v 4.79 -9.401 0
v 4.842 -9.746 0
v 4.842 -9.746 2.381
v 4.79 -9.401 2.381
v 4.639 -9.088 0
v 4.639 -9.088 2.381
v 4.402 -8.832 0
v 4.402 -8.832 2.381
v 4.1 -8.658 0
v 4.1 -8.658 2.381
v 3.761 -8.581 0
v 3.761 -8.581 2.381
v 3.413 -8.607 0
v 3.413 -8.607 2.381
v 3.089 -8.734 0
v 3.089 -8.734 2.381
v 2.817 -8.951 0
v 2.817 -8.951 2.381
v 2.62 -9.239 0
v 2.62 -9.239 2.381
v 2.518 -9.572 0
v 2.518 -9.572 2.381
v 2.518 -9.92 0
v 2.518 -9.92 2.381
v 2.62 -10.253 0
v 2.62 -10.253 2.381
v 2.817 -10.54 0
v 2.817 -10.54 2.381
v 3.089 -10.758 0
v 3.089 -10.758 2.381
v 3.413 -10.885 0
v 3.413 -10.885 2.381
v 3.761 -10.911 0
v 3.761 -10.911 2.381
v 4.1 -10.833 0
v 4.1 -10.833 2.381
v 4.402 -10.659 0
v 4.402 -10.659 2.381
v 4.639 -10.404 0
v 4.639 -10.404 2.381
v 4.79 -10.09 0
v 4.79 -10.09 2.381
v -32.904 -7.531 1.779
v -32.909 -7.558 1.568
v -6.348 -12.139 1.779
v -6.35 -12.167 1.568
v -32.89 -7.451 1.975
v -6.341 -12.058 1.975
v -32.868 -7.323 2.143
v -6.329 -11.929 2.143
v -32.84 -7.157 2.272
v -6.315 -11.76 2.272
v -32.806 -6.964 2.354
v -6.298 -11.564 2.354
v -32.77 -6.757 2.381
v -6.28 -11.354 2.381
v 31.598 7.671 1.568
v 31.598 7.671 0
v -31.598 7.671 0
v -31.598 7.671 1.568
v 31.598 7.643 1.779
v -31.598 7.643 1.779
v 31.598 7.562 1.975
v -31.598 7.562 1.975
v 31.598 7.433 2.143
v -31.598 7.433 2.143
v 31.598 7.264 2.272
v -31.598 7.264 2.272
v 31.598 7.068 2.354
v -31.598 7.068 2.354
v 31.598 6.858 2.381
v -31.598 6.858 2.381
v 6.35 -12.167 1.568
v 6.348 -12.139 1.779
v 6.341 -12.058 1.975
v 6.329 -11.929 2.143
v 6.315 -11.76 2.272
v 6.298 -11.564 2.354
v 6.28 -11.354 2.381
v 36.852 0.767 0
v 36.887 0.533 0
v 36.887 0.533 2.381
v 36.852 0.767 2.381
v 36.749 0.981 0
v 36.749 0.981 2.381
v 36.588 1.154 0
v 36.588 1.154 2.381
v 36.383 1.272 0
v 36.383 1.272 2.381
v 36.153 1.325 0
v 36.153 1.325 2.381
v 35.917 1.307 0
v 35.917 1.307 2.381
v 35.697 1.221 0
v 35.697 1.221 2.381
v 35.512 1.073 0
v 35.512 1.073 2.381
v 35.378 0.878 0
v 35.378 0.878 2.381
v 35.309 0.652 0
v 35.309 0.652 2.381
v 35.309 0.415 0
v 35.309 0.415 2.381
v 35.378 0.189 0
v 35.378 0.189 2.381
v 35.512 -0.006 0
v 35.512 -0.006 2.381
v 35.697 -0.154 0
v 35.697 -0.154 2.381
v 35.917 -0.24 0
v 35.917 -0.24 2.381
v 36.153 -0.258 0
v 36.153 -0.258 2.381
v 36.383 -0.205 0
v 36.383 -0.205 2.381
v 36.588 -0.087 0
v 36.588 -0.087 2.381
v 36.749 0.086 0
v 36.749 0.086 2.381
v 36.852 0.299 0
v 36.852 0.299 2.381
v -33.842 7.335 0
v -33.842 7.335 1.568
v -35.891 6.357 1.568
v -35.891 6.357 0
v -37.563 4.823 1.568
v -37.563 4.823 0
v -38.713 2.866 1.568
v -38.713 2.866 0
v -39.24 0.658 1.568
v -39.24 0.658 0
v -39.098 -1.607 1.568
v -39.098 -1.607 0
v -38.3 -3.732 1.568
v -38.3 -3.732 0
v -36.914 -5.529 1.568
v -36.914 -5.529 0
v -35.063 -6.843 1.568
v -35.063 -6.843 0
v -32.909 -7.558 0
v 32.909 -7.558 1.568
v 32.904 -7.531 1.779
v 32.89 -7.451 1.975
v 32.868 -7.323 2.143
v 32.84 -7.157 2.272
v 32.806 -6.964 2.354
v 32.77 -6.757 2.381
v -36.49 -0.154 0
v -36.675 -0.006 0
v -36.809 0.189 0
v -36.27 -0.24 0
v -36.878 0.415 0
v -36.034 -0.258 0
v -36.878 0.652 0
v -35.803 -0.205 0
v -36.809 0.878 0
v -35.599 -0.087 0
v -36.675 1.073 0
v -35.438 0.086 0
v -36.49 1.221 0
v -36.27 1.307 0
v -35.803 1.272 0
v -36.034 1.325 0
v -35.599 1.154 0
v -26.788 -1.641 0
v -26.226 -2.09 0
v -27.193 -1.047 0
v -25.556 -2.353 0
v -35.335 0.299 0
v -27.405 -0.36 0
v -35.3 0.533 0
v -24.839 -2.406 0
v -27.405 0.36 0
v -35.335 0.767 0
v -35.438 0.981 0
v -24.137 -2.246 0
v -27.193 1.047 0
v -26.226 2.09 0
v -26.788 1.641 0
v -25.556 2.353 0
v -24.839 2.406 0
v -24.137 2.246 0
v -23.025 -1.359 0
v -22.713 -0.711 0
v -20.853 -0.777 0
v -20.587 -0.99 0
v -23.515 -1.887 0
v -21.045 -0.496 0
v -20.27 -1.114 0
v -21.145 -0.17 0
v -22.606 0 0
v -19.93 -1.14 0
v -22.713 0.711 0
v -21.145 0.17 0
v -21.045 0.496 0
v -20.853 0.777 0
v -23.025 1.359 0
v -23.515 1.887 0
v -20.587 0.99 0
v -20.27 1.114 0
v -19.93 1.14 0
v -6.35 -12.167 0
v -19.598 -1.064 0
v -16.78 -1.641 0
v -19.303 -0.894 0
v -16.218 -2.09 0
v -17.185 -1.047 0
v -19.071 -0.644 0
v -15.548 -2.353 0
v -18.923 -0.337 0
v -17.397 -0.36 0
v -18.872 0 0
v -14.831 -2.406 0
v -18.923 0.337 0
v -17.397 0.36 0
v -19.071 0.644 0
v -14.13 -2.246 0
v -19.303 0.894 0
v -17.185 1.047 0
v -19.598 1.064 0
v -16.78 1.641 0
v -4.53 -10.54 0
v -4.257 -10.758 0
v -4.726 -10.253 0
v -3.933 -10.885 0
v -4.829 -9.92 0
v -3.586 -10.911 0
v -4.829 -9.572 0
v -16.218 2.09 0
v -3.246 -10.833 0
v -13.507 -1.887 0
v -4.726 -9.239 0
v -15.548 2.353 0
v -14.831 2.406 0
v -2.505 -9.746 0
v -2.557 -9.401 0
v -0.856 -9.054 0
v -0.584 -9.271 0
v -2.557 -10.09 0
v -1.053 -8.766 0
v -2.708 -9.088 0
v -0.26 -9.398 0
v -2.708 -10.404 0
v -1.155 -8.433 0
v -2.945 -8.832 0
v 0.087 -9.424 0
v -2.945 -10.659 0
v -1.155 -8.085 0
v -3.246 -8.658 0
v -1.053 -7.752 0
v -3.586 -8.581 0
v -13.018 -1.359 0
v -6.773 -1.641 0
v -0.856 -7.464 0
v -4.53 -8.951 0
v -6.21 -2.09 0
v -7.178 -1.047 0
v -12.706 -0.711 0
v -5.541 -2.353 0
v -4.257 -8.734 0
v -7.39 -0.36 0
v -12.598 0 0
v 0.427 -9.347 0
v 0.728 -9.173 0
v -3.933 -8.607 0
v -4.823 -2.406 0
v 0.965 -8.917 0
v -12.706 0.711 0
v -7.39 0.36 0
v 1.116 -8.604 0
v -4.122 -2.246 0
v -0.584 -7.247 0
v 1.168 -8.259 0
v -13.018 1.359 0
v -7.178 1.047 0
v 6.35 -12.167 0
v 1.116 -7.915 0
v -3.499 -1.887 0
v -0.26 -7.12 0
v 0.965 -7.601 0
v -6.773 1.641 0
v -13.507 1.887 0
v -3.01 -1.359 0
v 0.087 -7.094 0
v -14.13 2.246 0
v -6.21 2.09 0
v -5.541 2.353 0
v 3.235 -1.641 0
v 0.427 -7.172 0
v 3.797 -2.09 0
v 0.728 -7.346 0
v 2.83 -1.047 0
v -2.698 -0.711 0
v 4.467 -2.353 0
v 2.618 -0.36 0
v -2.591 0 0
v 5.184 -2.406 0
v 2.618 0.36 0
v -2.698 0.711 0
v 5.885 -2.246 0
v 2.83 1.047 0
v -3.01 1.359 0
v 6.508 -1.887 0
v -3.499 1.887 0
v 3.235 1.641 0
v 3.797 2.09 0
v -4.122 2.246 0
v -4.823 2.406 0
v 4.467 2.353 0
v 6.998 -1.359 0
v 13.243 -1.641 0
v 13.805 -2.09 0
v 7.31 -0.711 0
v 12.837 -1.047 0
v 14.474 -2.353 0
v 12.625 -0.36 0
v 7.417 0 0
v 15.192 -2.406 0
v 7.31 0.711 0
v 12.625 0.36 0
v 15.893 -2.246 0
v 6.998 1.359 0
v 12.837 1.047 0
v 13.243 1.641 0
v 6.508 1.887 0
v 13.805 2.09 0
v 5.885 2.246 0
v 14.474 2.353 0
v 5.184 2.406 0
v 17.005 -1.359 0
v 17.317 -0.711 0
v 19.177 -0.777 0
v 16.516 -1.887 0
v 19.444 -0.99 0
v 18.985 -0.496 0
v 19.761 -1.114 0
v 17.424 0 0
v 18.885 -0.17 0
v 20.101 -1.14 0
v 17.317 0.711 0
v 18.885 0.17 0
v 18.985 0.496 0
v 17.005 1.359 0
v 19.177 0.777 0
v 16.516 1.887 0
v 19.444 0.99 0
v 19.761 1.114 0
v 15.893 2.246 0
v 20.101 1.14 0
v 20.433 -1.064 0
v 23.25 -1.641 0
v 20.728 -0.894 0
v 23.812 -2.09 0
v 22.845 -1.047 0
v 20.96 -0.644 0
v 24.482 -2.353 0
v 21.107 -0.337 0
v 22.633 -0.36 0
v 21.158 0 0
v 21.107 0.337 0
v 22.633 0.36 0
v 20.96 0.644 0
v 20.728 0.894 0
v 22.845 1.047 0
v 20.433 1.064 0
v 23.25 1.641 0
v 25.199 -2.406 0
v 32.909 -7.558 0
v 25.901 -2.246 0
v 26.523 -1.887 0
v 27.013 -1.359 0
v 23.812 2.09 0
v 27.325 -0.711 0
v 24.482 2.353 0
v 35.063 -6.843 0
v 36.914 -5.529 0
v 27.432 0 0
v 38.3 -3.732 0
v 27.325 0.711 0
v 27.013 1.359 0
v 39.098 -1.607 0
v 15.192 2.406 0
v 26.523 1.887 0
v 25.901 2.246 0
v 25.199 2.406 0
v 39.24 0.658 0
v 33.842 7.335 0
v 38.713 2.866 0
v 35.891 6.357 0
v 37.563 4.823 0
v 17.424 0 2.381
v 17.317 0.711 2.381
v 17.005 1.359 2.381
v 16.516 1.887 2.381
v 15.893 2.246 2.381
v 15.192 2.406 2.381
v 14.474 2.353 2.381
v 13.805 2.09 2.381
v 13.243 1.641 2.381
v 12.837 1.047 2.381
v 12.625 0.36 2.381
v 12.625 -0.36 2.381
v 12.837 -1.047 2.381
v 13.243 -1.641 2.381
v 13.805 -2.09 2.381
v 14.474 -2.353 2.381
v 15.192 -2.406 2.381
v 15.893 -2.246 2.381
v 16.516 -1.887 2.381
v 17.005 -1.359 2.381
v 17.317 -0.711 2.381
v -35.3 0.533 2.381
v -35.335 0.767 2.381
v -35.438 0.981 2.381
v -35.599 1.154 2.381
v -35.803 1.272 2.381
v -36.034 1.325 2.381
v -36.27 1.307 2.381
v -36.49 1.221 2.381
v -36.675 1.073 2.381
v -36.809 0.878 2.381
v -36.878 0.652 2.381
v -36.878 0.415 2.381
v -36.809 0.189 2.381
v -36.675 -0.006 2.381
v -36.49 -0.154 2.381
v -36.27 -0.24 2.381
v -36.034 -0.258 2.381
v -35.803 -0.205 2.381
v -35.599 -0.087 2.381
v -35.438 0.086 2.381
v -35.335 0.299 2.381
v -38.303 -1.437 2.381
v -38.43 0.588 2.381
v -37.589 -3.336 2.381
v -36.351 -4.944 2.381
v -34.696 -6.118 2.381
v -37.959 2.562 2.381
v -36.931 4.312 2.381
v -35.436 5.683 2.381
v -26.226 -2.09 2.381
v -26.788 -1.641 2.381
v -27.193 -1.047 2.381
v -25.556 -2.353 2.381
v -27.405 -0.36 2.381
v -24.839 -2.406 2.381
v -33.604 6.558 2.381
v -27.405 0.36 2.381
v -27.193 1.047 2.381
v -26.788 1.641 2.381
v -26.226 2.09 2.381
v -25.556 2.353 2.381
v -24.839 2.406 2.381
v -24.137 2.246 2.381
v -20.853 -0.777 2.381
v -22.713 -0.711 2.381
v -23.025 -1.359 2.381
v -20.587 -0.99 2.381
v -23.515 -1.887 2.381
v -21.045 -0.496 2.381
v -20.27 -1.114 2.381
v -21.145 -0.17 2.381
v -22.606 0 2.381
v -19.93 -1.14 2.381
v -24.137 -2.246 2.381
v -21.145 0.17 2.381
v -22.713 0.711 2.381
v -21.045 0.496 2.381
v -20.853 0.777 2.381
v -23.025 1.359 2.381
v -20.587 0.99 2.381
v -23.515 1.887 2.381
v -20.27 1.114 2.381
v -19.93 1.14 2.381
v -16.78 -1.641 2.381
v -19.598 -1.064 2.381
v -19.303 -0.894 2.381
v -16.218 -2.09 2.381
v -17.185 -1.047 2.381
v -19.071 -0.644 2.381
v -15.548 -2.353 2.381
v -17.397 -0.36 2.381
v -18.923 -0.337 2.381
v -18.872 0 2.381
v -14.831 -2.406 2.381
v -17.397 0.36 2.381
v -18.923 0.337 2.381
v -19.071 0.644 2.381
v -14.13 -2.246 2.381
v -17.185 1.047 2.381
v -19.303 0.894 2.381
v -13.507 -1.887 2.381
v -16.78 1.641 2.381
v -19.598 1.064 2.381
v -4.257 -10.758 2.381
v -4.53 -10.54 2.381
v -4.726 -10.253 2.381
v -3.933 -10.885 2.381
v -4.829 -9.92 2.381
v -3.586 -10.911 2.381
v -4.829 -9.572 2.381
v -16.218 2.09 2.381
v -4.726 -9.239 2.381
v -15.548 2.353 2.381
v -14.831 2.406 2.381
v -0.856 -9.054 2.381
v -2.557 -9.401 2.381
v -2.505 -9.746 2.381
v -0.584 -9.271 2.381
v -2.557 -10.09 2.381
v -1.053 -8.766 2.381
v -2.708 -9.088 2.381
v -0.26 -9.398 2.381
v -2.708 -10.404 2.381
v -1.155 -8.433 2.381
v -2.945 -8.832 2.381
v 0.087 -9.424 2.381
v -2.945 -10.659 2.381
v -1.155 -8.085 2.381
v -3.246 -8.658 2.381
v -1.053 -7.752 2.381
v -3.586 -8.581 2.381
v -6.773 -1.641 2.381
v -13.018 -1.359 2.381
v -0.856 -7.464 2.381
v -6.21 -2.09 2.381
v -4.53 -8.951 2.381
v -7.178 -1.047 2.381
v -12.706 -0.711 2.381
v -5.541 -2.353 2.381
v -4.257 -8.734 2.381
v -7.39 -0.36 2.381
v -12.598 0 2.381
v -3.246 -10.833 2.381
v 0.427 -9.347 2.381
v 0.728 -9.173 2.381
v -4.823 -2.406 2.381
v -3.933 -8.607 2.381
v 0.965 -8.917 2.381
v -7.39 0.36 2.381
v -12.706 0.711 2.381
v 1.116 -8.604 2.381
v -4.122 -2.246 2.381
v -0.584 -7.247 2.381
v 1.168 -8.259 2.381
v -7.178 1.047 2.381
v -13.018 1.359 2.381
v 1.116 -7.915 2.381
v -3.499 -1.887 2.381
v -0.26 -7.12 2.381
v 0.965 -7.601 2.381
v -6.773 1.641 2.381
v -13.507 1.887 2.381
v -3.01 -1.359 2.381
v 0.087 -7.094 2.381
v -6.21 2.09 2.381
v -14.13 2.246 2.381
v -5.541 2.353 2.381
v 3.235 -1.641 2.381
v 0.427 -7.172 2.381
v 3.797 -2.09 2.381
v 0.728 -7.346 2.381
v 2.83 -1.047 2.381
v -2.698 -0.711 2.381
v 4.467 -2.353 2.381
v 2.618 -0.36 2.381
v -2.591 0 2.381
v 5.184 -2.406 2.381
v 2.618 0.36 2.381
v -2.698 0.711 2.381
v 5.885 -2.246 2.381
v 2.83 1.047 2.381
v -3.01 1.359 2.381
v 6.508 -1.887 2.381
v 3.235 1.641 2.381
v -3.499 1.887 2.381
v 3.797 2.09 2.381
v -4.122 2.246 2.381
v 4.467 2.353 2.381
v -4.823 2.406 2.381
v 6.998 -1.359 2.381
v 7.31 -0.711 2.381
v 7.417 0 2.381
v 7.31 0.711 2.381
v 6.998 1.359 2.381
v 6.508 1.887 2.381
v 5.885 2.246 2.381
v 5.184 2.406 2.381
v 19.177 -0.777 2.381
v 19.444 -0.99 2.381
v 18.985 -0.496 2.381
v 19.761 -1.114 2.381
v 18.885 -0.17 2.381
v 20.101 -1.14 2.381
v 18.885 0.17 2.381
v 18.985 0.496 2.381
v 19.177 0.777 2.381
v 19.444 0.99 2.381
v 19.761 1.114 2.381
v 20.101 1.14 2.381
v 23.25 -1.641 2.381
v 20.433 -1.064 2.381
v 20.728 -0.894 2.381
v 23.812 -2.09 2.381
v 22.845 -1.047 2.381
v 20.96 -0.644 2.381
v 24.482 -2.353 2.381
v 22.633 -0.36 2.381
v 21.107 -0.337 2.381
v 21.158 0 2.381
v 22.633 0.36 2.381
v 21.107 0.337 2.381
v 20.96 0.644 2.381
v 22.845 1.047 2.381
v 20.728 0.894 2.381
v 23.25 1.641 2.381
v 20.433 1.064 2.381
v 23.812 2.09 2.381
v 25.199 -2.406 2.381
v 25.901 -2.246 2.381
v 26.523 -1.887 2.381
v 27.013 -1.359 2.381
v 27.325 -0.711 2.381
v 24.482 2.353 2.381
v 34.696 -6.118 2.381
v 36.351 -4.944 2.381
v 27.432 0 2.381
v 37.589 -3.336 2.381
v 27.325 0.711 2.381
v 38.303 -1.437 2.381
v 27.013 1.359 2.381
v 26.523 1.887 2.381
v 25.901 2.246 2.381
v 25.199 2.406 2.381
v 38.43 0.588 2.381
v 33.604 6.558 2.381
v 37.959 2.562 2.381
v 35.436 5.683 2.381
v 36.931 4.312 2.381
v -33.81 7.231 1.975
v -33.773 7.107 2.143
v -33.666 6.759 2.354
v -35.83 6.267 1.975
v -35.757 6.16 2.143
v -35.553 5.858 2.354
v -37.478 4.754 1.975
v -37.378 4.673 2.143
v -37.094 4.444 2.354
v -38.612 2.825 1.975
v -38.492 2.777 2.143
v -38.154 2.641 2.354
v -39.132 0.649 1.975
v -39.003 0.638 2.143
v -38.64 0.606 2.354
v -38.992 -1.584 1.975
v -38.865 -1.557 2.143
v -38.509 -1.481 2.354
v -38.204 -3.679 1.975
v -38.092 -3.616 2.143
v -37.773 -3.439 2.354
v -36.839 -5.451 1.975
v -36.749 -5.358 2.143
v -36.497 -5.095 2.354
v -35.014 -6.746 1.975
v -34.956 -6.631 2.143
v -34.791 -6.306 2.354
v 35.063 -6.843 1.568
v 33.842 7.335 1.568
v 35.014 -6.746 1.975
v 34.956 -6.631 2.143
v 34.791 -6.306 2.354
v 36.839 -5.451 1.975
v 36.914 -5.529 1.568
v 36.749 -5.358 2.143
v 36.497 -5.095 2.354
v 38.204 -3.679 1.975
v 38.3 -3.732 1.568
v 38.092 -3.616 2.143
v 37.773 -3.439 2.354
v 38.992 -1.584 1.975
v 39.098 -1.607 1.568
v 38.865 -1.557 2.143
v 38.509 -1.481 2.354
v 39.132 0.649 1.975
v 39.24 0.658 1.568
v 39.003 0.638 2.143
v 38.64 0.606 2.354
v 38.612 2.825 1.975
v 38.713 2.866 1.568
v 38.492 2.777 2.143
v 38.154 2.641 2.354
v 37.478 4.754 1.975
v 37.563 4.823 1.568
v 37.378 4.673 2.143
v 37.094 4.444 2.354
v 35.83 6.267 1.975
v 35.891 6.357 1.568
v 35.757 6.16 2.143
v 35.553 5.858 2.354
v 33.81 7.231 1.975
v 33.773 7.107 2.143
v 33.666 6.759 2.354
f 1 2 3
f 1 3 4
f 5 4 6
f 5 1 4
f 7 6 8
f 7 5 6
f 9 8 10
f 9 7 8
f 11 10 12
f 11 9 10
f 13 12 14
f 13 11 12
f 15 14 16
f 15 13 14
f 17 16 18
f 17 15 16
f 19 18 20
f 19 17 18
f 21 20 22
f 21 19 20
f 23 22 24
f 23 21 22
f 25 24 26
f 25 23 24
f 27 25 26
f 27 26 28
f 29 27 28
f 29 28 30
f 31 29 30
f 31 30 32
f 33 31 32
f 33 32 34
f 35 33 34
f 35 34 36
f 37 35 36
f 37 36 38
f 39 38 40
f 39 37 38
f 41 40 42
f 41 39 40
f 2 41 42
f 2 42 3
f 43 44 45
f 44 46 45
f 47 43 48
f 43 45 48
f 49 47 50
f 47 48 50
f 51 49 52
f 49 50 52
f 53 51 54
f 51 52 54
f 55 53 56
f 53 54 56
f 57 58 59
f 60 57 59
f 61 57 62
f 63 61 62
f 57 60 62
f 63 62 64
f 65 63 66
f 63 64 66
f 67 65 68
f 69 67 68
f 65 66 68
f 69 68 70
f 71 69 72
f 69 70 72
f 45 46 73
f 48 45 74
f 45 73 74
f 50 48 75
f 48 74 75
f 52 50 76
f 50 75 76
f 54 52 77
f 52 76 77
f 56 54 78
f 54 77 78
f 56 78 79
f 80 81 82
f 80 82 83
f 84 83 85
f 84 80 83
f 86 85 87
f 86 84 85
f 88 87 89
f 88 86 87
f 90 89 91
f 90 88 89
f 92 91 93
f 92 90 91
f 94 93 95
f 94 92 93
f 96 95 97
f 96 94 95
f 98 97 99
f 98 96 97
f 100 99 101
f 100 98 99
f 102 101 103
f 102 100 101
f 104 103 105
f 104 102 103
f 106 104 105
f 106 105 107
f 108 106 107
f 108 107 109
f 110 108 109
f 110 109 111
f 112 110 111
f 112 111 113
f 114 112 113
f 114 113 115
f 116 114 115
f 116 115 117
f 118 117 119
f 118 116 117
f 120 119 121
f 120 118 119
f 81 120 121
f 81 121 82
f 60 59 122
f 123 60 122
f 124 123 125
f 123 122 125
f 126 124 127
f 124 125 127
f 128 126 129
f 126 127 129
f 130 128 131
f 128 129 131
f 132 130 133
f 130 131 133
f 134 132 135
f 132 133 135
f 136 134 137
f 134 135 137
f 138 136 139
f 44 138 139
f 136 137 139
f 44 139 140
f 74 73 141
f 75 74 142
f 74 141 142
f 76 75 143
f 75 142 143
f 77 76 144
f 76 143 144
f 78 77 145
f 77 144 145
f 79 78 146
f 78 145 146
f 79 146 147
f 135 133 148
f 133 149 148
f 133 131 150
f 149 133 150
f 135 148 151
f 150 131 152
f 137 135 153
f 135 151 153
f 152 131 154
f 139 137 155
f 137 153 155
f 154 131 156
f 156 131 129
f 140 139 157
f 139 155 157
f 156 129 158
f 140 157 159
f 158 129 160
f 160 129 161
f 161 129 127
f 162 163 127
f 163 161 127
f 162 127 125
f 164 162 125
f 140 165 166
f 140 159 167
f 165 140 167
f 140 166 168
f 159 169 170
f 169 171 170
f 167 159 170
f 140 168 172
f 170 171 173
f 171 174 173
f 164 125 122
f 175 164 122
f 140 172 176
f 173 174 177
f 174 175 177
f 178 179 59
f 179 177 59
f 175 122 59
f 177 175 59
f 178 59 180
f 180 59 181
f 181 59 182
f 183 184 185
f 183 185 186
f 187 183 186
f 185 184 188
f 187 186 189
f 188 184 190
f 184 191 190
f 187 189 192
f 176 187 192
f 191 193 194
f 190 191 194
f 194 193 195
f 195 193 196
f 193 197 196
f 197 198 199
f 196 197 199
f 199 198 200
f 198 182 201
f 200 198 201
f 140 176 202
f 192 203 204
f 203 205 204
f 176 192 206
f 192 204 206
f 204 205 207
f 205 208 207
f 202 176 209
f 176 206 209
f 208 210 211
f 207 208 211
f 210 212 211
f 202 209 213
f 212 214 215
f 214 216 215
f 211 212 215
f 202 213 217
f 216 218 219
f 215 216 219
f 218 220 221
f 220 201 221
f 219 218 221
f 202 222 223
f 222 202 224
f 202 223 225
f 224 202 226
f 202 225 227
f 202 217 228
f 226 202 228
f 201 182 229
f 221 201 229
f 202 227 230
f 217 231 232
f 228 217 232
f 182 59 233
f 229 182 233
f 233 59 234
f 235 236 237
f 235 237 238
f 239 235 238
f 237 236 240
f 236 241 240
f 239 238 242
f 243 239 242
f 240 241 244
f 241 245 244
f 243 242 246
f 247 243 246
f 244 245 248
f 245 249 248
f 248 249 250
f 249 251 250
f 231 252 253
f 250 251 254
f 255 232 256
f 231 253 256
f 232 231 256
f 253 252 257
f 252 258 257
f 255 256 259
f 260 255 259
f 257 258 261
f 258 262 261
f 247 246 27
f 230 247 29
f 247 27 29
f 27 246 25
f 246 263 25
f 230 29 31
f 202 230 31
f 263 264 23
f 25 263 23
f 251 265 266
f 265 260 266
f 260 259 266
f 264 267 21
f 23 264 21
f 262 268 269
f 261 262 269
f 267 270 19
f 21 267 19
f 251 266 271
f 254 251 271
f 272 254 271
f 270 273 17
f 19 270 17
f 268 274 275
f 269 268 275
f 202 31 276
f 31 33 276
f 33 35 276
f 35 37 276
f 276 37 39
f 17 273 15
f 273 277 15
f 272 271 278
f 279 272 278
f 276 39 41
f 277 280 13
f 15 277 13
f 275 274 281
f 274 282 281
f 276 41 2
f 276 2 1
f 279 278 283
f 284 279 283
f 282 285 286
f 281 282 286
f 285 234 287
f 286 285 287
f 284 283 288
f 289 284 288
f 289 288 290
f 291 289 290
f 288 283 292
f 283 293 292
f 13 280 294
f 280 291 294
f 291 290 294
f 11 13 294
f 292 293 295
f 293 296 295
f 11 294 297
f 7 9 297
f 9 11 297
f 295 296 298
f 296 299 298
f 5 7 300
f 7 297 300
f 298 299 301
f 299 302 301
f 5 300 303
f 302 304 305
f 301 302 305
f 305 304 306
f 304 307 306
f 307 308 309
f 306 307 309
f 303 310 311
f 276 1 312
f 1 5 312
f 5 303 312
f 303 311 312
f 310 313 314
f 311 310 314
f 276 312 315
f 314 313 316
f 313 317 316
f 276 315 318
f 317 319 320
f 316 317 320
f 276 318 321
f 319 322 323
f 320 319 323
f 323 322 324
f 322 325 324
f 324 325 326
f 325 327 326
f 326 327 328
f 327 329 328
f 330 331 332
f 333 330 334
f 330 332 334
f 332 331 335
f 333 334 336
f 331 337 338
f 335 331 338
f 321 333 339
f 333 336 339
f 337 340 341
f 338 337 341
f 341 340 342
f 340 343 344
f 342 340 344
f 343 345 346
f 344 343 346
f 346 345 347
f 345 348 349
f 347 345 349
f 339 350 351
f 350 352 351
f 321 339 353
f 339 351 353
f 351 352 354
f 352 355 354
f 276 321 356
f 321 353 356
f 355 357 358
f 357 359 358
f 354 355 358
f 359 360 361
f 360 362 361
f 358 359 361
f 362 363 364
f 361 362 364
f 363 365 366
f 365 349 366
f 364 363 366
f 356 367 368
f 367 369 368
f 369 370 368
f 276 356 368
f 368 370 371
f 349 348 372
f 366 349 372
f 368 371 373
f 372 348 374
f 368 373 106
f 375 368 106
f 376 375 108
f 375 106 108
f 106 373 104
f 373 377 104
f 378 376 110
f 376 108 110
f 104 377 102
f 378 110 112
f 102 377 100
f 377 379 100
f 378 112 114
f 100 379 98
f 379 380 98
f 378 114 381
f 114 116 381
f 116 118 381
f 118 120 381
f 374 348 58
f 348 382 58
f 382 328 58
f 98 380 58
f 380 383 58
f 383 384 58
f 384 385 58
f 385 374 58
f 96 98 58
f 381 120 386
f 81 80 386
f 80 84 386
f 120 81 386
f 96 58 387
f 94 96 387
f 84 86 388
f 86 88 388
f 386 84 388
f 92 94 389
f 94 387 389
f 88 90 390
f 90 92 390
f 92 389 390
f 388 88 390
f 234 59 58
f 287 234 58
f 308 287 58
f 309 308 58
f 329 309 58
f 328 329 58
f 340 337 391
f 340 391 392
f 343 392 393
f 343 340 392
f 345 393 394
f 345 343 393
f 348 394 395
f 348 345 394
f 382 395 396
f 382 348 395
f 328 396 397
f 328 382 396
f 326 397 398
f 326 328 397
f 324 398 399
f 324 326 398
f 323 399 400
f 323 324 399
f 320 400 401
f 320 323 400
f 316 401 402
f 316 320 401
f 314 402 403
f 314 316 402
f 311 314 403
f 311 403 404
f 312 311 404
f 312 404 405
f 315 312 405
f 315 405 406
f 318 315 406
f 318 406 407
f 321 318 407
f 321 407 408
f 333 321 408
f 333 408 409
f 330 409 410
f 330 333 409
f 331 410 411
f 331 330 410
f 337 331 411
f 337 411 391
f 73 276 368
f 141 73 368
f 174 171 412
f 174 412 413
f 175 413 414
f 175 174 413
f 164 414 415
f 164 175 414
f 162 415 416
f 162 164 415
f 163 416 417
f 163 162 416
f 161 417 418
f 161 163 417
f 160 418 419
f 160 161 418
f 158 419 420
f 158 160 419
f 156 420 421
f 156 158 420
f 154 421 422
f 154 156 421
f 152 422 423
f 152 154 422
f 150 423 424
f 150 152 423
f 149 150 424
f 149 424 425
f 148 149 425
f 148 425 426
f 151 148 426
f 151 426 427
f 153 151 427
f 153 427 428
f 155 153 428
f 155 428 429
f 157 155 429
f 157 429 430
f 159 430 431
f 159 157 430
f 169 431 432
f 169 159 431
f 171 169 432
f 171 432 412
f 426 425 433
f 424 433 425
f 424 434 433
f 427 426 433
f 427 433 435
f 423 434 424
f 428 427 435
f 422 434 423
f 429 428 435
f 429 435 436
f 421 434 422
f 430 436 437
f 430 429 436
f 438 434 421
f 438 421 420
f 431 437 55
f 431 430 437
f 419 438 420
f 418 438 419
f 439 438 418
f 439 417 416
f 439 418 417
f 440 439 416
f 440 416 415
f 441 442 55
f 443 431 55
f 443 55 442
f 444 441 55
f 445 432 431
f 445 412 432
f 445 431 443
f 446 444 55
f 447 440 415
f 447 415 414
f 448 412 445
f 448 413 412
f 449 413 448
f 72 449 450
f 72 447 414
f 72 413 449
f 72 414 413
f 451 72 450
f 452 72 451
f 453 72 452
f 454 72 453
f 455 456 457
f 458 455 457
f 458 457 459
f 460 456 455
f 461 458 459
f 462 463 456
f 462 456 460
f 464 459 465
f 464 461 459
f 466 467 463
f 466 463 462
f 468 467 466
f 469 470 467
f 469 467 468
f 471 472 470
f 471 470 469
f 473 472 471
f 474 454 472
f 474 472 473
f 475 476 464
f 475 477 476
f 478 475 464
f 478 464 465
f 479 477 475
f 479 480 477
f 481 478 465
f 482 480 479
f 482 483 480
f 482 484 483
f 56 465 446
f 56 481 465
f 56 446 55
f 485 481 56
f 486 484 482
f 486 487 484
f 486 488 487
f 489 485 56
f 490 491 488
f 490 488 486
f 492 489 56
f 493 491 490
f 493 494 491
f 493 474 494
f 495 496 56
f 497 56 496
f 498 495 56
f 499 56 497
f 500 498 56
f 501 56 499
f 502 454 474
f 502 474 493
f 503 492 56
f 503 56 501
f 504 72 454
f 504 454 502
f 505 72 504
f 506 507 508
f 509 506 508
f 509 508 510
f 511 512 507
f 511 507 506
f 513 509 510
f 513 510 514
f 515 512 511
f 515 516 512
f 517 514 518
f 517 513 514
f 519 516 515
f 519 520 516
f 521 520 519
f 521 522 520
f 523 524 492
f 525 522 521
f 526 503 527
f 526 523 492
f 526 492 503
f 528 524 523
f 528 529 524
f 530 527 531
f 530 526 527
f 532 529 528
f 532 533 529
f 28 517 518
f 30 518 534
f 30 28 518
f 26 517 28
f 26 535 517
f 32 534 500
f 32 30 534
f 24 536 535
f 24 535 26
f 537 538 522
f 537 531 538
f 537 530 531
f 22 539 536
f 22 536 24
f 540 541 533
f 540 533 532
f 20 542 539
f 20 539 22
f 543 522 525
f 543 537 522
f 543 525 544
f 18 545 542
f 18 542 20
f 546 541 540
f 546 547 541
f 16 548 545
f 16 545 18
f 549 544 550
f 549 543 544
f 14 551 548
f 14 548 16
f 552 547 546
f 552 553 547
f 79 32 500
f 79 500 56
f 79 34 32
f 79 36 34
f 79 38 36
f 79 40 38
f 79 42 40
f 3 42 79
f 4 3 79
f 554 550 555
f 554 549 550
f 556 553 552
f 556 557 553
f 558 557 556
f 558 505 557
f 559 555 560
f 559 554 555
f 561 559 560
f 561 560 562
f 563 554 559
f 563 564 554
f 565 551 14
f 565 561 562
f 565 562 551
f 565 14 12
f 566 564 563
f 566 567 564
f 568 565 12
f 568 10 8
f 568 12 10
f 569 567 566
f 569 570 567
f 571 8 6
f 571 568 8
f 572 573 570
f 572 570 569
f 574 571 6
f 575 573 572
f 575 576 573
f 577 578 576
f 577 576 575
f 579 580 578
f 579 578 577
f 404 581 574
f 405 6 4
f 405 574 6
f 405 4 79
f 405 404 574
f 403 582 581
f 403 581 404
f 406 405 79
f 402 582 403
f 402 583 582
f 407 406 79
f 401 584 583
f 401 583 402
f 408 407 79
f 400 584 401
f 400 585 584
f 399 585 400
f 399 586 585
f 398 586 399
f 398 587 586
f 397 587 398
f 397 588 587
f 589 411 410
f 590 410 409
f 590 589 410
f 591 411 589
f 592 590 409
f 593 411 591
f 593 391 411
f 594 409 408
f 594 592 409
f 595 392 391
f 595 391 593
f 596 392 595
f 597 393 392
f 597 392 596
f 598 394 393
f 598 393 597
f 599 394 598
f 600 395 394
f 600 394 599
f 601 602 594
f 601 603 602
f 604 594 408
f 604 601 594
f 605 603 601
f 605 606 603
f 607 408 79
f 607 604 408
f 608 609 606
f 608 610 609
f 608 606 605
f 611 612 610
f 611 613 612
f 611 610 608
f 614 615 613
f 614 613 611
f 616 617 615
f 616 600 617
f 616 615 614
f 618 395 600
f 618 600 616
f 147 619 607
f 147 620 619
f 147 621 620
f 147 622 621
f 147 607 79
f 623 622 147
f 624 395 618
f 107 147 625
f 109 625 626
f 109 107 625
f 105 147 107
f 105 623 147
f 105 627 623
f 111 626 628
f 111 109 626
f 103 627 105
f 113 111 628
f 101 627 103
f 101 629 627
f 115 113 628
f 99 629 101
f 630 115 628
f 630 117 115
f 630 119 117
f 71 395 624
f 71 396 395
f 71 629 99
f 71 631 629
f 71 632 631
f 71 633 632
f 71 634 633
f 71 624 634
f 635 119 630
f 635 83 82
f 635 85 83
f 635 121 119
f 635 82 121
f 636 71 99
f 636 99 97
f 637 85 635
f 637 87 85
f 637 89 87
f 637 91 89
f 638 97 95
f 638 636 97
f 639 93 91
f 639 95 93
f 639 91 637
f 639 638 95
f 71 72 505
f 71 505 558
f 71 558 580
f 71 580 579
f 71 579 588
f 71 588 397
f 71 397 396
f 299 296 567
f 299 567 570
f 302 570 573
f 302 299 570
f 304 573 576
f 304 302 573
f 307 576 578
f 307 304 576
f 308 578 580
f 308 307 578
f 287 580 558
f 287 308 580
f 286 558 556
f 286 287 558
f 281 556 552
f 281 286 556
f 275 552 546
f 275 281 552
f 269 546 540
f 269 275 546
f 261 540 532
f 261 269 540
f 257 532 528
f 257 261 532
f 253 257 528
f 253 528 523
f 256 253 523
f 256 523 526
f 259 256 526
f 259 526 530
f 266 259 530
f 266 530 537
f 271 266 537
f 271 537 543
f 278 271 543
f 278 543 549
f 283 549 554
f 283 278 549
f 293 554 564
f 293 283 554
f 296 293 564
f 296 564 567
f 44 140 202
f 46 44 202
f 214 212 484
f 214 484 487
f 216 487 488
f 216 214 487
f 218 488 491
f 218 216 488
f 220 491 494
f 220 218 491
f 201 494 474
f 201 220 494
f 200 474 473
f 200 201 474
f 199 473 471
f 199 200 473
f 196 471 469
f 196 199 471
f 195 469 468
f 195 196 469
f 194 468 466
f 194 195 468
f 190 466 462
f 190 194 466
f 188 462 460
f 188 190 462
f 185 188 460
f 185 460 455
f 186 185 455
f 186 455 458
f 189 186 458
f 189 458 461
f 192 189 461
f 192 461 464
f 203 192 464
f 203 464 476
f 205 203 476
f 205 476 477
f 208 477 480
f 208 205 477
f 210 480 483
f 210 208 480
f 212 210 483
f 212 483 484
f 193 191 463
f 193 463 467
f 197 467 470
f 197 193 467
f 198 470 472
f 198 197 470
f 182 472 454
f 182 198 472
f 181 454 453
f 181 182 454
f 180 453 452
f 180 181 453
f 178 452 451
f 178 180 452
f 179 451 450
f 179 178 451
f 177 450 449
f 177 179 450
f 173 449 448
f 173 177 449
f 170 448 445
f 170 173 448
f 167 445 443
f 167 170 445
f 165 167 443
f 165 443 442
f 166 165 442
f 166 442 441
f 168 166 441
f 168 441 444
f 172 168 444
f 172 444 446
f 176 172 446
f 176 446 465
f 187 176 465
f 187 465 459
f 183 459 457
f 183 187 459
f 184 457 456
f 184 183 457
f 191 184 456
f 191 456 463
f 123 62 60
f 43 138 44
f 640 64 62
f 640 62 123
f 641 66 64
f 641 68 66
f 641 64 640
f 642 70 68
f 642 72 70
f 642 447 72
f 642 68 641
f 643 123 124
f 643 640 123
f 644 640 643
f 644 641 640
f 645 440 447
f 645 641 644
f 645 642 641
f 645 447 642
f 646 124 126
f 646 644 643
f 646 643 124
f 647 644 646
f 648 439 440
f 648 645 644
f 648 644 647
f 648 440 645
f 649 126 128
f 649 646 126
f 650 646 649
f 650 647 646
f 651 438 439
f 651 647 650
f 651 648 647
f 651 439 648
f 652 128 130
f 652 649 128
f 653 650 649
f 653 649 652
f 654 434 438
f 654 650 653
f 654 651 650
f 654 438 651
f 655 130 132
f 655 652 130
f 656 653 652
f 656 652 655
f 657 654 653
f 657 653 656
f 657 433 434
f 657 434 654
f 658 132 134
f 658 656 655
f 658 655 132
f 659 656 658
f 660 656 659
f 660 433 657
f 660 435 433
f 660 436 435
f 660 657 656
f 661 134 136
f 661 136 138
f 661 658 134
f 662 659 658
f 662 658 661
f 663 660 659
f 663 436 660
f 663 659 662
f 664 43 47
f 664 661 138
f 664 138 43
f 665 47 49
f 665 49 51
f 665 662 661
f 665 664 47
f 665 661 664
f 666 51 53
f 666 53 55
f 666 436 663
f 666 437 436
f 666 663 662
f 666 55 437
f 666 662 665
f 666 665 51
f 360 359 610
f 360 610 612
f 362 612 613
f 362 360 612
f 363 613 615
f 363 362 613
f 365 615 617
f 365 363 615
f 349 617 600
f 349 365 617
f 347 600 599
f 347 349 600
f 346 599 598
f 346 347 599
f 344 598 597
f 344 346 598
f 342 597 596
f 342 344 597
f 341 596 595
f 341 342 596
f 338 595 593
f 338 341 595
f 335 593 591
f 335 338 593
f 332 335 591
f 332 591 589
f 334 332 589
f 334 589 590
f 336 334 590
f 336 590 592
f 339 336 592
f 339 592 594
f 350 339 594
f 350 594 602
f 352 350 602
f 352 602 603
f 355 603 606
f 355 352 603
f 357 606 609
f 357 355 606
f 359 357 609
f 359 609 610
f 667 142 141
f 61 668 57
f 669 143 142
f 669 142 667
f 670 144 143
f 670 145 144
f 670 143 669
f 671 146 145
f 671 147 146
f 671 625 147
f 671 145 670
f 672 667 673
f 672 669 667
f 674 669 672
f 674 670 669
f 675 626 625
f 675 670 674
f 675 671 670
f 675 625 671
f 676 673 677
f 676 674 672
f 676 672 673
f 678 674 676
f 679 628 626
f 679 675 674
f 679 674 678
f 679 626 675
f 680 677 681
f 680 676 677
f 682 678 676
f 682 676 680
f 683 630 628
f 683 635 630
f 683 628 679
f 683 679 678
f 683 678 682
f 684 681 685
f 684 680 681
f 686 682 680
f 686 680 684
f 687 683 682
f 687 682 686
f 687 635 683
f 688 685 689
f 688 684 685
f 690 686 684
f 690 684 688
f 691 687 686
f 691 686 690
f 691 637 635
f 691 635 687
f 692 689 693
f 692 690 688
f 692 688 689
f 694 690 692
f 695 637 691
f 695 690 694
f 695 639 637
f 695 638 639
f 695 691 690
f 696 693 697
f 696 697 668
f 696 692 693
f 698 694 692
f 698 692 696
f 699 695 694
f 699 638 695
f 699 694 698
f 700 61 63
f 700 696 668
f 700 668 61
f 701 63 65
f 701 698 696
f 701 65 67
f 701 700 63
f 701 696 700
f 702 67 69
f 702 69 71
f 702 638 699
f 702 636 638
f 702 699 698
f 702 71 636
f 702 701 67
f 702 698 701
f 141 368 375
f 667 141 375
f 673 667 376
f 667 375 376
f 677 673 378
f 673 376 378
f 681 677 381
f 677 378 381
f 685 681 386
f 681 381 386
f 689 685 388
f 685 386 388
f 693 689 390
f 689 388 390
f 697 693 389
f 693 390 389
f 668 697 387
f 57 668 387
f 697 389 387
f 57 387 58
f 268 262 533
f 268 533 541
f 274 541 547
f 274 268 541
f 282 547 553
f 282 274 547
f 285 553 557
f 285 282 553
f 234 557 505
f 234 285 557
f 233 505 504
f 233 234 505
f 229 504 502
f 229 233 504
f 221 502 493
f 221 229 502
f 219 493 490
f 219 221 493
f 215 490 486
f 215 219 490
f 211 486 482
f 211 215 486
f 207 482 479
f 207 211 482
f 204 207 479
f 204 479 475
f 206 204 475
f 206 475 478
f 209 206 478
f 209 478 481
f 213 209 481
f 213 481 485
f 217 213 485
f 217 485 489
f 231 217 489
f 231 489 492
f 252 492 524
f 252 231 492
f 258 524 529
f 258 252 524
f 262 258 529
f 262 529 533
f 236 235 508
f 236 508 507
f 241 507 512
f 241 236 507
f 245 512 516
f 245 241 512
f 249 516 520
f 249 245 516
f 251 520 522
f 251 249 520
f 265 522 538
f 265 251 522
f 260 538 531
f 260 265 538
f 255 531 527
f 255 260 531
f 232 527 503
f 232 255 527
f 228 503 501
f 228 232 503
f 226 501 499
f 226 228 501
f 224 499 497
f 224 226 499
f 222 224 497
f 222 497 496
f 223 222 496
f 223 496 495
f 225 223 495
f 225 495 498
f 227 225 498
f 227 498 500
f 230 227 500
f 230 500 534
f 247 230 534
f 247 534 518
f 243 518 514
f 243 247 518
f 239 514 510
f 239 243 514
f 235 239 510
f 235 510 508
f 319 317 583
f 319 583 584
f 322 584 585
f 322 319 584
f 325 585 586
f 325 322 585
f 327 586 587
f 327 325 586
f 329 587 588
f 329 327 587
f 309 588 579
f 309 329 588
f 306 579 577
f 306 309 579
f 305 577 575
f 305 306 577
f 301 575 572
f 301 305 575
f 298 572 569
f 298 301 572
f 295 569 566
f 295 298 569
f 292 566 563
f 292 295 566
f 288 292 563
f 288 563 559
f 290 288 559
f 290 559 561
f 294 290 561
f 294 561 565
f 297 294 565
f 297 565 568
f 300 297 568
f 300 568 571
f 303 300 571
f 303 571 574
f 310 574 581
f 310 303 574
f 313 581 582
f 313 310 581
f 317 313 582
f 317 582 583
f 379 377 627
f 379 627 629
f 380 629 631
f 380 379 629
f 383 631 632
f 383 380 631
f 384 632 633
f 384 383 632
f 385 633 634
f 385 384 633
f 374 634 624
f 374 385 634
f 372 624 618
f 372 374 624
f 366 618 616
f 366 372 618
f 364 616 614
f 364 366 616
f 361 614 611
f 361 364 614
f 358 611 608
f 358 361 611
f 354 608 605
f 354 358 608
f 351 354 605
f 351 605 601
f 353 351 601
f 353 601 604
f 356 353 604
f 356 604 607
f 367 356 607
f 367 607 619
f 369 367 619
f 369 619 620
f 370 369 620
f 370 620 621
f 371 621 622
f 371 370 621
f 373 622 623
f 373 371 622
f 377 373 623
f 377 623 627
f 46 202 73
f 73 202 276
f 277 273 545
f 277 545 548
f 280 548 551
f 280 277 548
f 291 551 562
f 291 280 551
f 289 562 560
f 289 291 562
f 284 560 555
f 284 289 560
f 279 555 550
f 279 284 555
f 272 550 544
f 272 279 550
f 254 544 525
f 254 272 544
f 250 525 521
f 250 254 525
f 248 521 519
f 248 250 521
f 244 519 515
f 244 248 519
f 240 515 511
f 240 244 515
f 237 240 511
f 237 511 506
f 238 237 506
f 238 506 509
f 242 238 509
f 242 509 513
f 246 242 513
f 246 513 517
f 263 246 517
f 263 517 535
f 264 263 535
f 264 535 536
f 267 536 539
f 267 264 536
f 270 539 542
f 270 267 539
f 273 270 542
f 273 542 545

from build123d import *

# Parameters (mm, degrees)
F0_R     = 1.1684
F0_R_2   = 2.413
F0_R_3   = 1.143
F0_R_4   = 0.79375
F1_DEPTH = 2.38125
F2_R     = 0.8128


with BuildPart() as f1:
    # F0 (on Top) → F1 (new body)
    with BuildSketch(Plane.XY):
        with BuildLine():
            Line((31.5976, 7.6708), (0, 7.6708))
            Line((0, 7.6708), (-31.5976, 7.6708))
            ThreePointArc((-31.5976, 7.6708), (-39.240111, 0.658177), (-32.909099, -7.557853))
            Line((-32.909099, -7.557853), (-6.35, -12.1666))
            Line((-6.35, -12.1666), (6.35, -12.1666))
            Line((6.35, -12.1666), (32.909099, -7.557853))
            ThreePointArc((32.909099, -7.557853), (39.240111, 0.658177), (31.5976, 7.6708))
        make_face()
        with Locations((-3.673187, -9.745723)):
            Circle(F0_R, mode=Mode.SUBTRACT)
        with Locations((3.673187, -9.745723)):
            Circle(F0_R, mode=Mode.SUBTRACT)
        with Locations((0, -8.259213)):
            Circle(F0_R, mode=Mode.SUBTRACT)
        with Locations((-25.019, 0)):
            Circle(F0_R_2, mode=Mode.SUBTRACT)
        with Locations((-20.0152, 0)):
            Circle(F0_R_3, mode=Mode.SUBTRACT)
        with Locations((-36.0934, 0.5334)):
            Circle(F0_R_4, mode=Mode.SUBTRACT)
        with Locations((-15.0114, 0)):
            Circle(F0_R_2, mode=Mode.SUBTRACT)
        with Locations((-5.0038, 0)):
            Circle(F0_R_2, mode=Mode.SUBTRACT)
        with Locations((5.0038, 0)):
            Circle(F0_R_2, mode=Mode.SUBTRACT)
        with Locations((15.0114, 0)):
            Circle(F0_R_2, mode=Mode.SUBTRACT)
        with Locations((20.0152, 0)):
            Circle(F0_R_3, mode=Mode.SUBTRACT)
        with Locations((25.019, 0)):
            Circle(F0_R_2, mode=Mode.SUBTRACT)
        with Locations((36.0934, 0.5334)):
            Circle(F0_R_4, mode=Mode.SUBTRACT)
    extrude(amount=F1_DEPTH)

    # F2
    f2_edges = [f1.edges().sort_by_distance(p)[0] for p in [
        (-39.240111, 0.658177, 2.38125),
        (-19.629549, -9.862227, 2.38125),
        (0, -12.1666, 2.38125),
    ]]
    fillet(f2_edges, radius=F2_R)


solid = f1.part
